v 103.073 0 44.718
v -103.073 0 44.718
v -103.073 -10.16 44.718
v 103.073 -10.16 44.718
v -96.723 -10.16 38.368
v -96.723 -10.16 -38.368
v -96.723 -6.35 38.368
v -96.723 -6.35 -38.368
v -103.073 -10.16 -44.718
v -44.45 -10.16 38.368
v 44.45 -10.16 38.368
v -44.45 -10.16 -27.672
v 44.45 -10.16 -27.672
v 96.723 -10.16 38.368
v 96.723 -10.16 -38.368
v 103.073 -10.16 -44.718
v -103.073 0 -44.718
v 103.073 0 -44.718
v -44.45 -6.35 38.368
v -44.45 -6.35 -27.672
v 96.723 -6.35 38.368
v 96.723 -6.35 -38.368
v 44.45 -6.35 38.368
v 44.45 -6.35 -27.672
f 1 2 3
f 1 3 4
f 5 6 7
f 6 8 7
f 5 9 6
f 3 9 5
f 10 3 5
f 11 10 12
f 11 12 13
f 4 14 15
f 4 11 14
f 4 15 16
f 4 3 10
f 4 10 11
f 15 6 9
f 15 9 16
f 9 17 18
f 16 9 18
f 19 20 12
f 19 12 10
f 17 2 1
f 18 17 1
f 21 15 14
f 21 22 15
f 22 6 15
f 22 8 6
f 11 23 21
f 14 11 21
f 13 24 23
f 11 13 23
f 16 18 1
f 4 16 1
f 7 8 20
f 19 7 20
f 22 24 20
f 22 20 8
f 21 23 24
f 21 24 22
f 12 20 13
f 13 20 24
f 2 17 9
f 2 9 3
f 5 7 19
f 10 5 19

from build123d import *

# Parameters (mm, degrees)
F0_W     = 206.1464
F0_H     = 89.435898
F1_DEPTH = 10.16
F2_T     = -6.35
F3_W     = 88.9
F3_H     = 66.04
F4_DEPTH = 3.81


with BuildPart() as f1:
    # F0 (on Front) → F1 (new body)
    with BuildSketch(Plane.XZ):
        Rectangle(F0_W, F0_H)
    extrude(amount=F1_DEPTH)

    # F2
    f2_openings = [f1.faces().sort_by_distance(p)[0] for p in [
        (0, -10.16, 0),
    ]]
    offset(amount=F2_T, openings=f2_openings)

    # F3 (on face) → F4 (join, through all)
    with BuildSketch(Plane.XZ.offset(6.35)):
        with Locations((0, 5.347949)):
            Rectangle(F3_W, F3_H)
    extrude(amount=F4_DEPTH)


solid = f1.part
